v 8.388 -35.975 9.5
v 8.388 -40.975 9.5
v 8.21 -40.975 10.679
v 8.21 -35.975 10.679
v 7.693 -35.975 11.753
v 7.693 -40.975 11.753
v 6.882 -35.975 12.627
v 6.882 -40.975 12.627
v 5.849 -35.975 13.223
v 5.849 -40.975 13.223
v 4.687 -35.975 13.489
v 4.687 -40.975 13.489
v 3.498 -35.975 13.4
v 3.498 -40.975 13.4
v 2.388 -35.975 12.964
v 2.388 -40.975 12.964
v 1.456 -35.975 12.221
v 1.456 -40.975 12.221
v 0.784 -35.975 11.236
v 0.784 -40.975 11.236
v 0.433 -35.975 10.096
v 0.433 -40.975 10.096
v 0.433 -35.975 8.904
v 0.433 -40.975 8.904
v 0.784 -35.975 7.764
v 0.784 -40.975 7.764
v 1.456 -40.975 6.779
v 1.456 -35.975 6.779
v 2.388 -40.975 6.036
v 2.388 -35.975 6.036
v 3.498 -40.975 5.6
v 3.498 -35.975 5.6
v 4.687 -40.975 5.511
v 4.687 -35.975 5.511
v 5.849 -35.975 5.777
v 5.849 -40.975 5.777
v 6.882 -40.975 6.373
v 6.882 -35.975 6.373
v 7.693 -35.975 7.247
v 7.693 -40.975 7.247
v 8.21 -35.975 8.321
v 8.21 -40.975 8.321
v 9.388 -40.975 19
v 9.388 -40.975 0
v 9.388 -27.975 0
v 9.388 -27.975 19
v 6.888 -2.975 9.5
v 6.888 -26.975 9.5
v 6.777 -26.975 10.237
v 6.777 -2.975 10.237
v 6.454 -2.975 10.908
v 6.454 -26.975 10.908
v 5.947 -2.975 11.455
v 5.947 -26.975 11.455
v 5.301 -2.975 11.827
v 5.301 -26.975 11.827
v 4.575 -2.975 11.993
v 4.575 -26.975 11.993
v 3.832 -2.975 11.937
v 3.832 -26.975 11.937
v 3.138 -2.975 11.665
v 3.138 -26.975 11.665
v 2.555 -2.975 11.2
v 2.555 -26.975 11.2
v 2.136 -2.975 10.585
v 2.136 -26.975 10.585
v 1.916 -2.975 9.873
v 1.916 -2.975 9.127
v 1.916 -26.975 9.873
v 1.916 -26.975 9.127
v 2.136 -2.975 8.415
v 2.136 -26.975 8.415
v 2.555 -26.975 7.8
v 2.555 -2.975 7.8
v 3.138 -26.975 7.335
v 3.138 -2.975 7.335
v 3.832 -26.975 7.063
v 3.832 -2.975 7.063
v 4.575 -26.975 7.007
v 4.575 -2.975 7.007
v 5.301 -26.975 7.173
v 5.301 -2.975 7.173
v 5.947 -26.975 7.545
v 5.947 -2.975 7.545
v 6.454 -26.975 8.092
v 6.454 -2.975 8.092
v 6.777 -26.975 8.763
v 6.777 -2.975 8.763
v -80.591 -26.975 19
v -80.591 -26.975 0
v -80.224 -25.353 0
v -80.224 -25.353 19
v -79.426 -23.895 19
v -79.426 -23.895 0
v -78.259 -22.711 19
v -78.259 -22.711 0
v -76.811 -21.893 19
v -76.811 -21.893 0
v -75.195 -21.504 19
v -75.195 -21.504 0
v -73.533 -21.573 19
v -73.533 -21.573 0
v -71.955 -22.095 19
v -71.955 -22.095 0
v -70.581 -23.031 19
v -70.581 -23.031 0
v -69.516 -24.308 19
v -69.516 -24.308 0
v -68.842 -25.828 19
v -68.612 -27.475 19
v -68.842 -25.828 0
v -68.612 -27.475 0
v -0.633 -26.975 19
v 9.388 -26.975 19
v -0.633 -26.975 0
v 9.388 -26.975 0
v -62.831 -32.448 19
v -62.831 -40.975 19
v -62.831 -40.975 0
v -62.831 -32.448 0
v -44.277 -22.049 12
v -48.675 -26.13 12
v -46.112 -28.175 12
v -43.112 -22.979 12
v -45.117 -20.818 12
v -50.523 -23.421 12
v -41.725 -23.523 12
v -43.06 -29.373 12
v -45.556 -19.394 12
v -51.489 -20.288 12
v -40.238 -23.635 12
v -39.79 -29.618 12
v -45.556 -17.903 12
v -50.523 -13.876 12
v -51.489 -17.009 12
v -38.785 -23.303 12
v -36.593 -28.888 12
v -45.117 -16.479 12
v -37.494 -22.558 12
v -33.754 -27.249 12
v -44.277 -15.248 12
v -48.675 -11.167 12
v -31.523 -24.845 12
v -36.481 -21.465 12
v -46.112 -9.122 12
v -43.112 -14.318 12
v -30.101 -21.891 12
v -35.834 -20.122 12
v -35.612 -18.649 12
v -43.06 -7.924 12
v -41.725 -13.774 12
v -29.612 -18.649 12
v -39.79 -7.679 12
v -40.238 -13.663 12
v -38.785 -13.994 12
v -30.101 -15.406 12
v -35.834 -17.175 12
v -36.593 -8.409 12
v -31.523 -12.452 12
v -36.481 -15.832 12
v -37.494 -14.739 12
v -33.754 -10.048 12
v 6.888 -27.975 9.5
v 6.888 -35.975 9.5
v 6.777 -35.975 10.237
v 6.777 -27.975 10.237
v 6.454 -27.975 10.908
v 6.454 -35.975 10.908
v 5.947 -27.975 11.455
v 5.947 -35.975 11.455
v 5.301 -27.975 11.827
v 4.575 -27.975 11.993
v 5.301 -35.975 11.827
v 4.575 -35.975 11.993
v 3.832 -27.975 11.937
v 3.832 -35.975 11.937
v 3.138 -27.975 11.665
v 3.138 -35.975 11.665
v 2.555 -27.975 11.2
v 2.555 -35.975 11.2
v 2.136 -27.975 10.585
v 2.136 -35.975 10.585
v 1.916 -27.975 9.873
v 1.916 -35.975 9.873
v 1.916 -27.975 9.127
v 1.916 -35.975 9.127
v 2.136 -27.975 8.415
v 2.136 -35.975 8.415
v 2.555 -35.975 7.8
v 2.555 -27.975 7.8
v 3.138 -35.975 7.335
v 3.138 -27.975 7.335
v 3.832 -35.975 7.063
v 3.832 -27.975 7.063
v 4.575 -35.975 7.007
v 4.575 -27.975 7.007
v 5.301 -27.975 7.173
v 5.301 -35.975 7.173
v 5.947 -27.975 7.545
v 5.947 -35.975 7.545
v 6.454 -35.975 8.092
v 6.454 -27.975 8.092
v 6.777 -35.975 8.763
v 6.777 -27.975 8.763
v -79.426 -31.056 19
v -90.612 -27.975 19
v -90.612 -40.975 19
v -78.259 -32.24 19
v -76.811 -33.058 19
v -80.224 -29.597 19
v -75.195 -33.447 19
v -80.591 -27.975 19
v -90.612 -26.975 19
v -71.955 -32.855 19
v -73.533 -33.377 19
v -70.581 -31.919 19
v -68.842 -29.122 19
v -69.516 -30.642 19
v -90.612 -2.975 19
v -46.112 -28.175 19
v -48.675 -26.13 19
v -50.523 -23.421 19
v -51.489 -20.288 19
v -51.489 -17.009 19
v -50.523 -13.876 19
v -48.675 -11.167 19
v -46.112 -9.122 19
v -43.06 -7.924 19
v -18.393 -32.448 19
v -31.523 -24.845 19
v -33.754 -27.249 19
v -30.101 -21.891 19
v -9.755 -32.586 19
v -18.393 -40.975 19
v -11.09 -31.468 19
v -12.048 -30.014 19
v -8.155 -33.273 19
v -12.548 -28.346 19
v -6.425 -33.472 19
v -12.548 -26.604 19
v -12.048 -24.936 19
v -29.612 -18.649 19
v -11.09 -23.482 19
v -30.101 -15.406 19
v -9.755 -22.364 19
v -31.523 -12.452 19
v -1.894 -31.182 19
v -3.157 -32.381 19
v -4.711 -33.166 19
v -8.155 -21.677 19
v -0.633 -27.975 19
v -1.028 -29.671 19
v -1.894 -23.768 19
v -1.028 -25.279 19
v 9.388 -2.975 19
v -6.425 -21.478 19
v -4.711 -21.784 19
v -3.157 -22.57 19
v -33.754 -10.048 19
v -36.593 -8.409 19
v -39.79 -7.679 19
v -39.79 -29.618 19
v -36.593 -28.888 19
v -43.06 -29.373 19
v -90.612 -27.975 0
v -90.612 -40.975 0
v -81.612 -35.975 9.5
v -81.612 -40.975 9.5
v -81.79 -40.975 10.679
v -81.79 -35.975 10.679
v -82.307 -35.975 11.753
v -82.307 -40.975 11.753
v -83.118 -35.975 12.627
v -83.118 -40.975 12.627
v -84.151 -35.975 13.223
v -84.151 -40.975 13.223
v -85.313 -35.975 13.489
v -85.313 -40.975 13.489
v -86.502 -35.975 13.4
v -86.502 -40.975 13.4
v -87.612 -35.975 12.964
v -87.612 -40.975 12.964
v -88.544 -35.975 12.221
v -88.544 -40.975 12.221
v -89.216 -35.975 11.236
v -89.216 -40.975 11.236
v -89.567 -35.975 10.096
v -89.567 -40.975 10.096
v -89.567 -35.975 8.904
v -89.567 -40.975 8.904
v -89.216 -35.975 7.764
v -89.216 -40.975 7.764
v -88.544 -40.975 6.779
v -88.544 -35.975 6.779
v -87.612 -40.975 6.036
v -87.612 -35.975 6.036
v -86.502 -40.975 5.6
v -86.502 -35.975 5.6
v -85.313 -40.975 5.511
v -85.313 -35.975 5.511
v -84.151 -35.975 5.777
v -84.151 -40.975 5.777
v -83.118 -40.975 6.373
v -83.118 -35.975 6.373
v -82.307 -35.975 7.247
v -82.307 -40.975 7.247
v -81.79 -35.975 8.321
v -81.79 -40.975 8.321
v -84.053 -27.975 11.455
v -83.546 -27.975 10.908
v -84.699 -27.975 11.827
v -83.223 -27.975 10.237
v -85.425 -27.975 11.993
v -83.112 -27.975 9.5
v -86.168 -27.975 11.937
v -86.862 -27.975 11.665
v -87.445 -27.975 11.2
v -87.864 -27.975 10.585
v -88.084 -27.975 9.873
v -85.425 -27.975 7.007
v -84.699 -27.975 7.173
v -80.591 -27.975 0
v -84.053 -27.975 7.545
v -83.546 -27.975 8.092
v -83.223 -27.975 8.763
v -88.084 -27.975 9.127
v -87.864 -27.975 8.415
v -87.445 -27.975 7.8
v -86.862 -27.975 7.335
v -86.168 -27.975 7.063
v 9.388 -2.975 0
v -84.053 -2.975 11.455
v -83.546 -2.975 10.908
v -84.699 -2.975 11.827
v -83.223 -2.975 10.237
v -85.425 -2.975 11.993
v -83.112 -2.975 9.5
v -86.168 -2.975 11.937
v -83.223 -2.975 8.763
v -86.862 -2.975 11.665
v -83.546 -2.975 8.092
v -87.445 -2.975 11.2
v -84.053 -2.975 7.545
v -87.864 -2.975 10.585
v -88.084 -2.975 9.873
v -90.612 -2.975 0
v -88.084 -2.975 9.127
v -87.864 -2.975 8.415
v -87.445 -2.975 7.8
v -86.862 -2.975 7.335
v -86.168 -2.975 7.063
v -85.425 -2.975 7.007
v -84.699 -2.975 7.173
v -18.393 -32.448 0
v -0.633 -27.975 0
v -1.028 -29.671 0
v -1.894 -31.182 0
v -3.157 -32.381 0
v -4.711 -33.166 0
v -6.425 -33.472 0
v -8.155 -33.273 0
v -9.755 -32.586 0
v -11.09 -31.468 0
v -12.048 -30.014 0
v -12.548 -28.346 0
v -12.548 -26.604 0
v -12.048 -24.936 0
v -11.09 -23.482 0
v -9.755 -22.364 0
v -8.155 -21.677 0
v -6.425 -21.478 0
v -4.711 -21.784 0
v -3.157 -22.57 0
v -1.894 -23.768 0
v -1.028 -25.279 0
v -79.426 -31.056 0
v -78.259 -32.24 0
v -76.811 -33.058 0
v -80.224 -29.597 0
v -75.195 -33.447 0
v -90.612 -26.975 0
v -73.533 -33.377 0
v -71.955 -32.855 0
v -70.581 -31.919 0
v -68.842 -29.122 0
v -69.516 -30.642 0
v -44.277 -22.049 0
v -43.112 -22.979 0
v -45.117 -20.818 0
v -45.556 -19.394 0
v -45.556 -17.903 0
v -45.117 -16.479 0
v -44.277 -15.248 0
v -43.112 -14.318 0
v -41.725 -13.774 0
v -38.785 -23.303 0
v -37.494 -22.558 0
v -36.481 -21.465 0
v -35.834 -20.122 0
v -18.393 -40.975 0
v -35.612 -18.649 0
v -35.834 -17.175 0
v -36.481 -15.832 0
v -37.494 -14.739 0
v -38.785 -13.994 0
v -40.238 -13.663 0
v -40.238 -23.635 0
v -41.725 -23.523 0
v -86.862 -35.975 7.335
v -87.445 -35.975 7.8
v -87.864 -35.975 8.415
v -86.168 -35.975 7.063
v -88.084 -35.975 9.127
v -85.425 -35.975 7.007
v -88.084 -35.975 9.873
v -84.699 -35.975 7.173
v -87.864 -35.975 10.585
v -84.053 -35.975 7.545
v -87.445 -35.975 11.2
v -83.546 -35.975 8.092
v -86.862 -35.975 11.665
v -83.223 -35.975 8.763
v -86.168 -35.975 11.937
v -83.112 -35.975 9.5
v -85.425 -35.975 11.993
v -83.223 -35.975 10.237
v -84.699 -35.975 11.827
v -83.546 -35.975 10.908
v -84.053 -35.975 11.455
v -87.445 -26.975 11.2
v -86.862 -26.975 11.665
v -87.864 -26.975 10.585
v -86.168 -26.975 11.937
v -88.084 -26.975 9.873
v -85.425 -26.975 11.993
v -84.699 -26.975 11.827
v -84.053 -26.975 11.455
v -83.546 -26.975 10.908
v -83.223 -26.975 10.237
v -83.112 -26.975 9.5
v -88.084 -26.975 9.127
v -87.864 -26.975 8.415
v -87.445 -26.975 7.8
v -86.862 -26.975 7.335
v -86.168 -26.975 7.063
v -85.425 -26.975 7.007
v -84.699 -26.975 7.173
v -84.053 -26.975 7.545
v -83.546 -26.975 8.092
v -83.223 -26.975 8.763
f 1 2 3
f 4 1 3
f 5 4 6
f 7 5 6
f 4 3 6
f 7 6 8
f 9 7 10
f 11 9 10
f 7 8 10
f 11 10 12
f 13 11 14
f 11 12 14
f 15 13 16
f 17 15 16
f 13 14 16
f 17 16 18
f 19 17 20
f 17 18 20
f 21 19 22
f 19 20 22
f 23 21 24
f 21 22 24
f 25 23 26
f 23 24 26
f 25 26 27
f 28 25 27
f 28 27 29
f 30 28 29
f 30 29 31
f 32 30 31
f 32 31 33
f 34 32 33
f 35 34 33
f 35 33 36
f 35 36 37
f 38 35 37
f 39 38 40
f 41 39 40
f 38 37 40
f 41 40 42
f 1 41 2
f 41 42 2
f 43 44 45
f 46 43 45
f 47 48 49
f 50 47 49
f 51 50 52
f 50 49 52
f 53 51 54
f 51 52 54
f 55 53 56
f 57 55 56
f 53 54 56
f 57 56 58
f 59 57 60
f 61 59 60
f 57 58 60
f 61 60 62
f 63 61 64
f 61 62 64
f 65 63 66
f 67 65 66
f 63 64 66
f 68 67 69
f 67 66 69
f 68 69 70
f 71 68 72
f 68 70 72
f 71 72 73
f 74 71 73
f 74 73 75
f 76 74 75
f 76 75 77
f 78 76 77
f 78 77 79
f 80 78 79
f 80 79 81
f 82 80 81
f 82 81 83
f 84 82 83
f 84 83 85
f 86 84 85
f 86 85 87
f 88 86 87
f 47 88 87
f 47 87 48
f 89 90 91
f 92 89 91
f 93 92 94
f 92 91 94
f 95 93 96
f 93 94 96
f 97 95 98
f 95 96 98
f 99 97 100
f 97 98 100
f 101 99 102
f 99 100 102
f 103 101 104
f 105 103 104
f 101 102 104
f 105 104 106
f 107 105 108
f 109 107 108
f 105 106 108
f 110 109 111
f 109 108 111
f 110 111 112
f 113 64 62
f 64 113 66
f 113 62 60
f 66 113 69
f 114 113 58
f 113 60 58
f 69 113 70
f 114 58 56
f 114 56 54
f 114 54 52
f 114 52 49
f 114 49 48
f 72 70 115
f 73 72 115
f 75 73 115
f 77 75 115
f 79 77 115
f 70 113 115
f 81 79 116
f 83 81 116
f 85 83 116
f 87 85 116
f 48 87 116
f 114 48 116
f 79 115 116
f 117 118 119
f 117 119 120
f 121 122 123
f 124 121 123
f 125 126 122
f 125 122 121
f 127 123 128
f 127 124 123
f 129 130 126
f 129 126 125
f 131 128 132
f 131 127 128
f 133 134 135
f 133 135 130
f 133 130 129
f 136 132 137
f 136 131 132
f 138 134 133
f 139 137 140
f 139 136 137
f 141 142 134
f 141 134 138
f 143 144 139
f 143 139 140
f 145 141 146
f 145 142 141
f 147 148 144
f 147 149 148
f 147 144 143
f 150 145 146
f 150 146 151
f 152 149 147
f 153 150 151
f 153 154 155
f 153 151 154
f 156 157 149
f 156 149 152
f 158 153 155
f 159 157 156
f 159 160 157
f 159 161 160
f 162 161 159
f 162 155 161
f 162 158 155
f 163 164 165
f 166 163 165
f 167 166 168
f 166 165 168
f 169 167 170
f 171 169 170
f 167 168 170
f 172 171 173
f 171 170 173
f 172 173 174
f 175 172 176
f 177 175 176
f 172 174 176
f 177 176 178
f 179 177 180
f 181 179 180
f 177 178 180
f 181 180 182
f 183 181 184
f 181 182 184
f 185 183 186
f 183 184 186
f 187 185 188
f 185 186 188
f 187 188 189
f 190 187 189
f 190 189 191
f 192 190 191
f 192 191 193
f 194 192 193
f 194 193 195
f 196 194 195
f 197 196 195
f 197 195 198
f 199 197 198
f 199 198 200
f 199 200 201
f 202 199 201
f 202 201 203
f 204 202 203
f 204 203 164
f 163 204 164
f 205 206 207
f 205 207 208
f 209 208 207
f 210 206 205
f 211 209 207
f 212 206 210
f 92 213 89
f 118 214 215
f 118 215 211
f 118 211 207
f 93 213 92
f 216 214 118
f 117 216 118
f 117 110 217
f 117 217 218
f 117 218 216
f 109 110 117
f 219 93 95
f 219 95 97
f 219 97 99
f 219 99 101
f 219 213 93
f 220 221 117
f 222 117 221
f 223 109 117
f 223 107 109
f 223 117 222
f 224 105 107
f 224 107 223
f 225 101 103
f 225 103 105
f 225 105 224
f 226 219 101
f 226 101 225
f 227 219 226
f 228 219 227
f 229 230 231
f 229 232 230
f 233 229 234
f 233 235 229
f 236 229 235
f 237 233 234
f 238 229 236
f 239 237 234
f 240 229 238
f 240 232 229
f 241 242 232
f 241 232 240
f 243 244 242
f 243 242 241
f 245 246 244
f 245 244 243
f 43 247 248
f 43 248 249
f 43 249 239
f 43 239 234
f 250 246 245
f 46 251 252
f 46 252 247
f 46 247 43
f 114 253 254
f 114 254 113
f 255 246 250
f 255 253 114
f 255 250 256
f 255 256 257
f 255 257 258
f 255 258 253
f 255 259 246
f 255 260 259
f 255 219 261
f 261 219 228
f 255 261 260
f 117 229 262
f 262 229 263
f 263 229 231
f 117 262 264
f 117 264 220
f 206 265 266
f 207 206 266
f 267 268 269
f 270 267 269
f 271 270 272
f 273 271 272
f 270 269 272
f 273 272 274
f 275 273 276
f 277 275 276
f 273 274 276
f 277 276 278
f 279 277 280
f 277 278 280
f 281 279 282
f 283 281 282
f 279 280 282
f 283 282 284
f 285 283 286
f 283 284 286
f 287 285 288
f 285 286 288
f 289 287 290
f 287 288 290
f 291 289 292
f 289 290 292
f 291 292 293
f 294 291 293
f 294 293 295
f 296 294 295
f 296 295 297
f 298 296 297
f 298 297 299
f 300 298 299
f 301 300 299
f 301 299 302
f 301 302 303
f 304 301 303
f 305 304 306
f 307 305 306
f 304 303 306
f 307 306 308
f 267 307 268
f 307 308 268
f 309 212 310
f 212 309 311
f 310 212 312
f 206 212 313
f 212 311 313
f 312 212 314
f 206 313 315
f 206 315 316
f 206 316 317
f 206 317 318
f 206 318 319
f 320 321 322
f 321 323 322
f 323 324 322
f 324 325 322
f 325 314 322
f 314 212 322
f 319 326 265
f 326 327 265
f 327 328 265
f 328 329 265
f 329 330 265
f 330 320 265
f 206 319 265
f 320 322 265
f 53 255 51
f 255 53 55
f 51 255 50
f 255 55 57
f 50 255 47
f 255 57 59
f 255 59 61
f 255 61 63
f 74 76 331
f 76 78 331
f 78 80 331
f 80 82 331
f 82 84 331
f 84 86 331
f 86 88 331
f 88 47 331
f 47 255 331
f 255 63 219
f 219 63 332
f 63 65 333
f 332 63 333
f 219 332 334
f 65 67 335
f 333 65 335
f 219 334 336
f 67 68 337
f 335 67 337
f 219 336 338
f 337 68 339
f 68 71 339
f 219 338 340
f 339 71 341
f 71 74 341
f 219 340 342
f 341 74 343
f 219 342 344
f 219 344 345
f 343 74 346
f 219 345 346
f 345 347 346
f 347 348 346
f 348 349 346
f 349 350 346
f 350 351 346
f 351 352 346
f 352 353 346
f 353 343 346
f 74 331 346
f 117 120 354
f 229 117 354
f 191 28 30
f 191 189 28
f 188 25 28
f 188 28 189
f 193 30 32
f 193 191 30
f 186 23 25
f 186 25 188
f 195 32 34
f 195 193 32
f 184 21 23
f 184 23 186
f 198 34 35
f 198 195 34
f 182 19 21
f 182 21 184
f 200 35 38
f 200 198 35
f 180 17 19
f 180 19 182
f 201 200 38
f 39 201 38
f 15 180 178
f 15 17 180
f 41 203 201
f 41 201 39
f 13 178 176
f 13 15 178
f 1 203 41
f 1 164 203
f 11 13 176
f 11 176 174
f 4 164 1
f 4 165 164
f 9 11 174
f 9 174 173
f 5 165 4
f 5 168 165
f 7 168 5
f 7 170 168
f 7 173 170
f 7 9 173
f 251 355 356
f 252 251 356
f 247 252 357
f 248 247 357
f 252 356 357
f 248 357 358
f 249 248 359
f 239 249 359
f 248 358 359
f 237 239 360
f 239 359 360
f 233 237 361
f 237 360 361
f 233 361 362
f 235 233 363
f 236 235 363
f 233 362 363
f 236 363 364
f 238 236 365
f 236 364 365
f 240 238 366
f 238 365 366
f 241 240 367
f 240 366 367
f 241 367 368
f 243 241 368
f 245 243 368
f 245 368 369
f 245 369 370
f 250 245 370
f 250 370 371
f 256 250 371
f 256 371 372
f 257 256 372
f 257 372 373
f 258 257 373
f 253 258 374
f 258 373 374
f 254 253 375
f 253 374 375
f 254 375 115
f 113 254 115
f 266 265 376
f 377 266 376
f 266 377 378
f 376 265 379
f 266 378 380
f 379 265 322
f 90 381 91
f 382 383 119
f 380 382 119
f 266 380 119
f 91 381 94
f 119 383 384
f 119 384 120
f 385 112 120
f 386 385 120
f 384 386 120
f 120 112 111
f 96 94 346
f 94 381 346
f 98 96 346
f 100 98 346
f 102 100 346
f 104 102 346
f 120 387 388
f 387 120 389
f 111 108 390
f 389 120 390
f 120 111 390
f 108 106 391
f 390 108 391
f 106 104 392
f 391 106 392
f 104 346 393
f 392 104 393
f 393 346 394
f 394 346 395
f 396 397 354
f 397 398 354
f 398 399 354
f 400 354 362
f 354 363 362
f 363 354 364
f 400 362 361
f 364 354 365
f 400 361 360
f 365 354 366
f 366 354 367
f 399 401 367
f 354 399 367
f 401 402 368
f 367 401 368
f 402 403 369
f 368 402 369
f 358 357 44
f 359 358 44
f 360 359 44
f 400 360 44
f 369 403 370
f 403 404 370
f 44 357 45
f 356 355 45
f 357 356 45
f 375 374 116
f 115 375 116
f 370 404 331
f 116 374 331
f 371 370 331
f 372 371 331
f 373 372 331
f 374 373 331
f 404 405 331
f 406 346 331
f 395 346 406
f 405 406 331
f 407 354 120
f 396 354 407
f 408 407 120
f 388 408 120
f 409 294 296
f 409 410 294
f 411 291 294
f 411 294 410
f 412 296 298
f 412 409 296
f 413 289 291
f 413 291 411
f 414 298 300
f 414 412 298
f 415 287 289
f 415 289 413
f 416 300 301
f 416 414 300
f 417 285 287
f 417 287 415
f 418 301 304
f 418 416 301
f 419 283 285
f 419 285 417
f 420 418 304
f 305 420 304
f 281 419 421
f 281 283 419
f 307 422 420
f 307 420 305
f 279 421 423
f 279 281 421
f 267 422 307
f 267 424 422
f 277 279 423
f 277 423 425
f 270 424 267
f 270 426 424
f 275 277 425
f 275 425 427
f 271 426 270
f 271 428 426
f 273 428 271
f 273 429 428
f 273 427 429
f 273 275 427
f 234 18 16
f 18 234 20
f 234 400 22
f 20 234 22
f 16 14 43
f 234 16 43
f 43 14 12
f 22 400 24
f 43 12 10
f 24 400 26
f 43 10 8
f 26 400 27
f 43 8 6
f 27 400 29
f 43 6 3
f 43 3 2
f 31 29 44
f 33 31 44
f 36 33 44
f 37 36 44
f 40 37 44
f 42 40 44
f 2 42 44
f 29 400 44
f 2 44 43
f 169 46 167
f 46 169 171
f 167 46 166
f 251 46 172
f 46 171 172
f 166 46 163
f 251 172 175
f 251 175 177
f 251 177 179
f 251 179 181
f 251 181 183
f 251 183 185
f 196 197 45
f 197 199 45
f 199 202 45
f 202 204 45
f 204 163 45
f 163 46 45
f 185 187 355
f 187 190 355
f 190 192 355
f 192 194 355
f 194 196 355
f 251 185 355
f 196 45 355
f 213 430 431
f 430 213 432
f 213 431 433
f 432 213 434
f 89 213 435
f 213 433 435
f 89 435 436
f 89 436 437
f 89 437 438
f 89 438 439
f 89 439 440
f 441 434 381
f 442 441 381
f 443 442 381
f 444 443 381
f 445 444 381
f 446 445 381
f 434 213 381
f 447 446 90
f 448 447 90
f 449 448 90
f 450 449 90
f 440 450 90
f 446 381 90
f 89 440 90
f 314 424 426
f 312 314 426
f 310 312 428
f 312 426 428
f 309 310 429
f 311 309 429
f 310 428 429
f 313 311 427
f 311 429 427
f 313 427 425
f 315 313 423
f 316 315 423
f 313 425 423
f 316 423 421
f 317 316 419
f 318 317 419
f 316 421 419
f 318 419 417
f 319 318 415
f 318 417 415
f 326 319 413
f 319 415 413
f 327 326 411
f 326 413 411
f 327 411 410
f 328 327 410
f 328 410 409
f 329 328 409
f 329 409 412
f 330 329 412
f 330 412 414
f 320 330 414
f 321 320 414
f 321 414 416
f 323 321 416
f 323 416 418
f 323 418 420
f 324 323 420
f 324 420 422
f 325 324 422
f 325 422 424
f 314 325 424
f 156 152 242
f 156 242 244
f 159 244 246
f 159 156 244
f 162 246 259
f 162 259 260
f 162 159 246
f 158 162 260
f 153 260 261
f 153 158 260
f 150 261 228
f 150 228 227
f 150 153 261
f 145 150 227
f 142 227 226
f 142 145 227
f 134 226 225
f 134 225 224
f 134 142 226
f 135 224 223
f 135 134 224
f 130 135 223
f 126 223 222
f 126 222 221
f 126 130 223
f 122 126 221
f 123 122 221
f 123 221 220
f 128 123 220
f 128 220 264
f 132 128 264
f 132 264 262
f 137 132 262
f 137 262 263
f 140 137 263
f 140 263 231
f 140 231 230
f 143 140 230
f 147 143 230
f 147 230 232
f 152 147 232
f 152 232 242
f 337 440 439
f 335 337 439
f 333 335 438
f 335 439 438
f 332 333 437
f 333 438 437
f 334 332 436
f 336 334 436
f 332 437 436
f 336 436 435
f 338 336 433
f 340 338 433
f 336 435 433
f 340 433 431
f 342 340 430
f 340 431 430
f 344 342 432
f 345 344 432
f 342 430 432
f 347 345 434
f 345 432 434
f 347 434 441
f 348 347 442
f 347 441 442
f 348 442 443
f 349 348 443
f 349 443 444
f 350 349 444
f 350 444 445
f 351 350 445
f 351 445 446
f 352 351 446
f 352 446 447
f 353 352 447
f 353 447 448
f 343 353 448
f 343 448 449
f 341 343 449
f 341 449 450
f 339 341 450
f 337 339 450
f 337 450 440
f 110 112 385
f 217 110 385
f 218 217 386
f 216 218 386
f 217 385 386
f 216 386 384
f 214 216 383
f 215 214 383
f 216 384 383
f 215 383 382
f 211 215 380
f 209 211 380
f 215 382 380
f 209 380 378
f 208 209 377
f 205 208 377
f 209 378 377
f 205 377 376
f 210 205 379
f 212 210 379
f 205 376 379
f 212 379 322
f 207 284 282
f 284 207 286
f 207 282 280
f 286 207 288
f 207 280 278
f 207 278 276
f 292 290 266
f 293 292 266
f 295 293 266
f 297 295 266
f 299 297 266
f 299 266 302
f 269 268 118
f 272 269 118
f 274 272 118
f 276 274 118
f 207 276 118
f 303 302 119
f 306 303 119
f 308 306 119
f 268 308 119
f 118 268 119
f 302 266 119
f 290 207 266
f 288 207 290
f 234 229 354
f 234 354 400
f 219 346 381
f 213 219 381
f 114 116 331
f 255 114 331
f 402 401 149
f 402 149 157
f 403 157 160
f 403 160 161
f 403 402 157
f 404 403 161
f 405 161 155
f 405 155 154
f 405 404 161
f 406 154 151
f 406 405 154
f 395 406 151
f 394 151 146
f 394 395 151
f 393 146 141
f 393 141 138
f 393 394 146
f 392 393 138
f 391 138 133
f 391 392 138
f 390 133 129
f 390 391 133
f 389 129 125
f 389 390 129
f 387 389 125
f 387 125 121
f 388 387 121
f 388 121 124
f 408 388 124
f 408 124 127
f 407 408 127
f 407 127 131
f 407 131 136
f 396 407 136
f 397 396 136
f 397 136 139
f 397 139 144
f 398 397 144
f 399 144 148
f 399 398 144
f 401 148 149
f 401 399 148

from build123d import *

# Parameters (mm, degrees)
F0_R     = 11
F1_DEPTH = 19
F0_R_2   = 5
F2_DEPTH = 12
F3_R     = 2.5
F4_DEPTH = 38.001
F3_R_2   = 4
F5_DEPTH = 5


with BuildPart() as f1:
    # F0 (on Top) → F1 (new body)
    with BuildSketch(Plane.XY):
        with BuildLine():
            Line((9.388096, -2.975142), (-90.611904, -2.975142))
            Line((-90.611904, -2.975142), (-90.611904, -26.975142))
            Line((-90.611904, -26.975142), (-80.591034, -26.975142))
            ThreePointArc((-80.591034, -26.975142), (-74.361686, -21.480362), (-68.611904, -27.475142))
            ThreePointArc((-68.611904, -27.475142), (-74.361686, -33.469923), (-80.591034, -27.975142))
            Line((-80.591034, -27.975142), (-90.611904, -27.975142))
            Line((-90.611904, -27.975142), (-90.611904, -40.975142))
            Line((-90.611904, -40.975142), (-62.83059, -40.975142))
            Line((-62.83059, -40.975142), (-62.83059, -32.448158))
            Line((-62.83059, -32.448158), (-18.393222, -32.448158))
            Line((-18.393222, -32.448158), (-18.393222, -40.975142))
            Line((-18.393222, -40.975142), (9.388096, -40.975142))
            Line((9.388096, -40.975142), (9.388096, -27.975142))
            Line((9.388096, -27.975142), (-0.632774, -27.975142))
            ThreePointArc((-0.632774, -27.975142), (-12.611904, -27.475142), (-0.632774, -26.975142))
            Line((-0.632774, -26.975142), (9.388096, -26.975142))
            Line((9.388096, -26.975142), (9.388096, -2.975142))
        make_face()
        with Locations((-40.611904, -18.648577)):
            Circle(F0_R, mode=Mode.SUBTRACT)
    extrude(amount=F1_DEPTH)

    # F0 (on Top) → F2 (join)
    with BuildSketch(Plane.XY):
        with Locations((-40.611904, -18.648577)):
            Circle(F0_R)
        with Locations((-40.611904, -18.648577)):
            Circle(F0_R_2, mode=Mode.SUBTRACT)
    extrude(amount=F2_DEPTH)

    # F3 (on face) → F4 (cut, through all)
    with BuildSketch(Plane.XZ.offset(40.975142)):
        with Locations((-85.611904, 9.5)):
            Circle(F3_R)
        with Locations((4.388096, 9.5)):
            Circle(F3_R)
    extrude(amount=-F4_DEPTH, mode=Mode.SUBTRACT)

    # F3 (on face) → F5 (cut)
    with BuildSketch(Plane.XZ.offset(40.975142)):
        with Locations((-85.611904, 9.5)):
            Circle(F3_R_2)
        with Locations((-85.611904, 9.5)):
            Circle(F3_R, mode=Mode.SUBTRACT)
        with Locations((4.388096, 9.5)):
            Circle(F3_R_2)
        with Locations((4.388096, 9.5)):
            Circle(F3_R, mode=Mode.SUBTRACT)
    extrude(amount=-F5_DEPTH, mode=Mode.SUBTRACT)


solid = f1.part
